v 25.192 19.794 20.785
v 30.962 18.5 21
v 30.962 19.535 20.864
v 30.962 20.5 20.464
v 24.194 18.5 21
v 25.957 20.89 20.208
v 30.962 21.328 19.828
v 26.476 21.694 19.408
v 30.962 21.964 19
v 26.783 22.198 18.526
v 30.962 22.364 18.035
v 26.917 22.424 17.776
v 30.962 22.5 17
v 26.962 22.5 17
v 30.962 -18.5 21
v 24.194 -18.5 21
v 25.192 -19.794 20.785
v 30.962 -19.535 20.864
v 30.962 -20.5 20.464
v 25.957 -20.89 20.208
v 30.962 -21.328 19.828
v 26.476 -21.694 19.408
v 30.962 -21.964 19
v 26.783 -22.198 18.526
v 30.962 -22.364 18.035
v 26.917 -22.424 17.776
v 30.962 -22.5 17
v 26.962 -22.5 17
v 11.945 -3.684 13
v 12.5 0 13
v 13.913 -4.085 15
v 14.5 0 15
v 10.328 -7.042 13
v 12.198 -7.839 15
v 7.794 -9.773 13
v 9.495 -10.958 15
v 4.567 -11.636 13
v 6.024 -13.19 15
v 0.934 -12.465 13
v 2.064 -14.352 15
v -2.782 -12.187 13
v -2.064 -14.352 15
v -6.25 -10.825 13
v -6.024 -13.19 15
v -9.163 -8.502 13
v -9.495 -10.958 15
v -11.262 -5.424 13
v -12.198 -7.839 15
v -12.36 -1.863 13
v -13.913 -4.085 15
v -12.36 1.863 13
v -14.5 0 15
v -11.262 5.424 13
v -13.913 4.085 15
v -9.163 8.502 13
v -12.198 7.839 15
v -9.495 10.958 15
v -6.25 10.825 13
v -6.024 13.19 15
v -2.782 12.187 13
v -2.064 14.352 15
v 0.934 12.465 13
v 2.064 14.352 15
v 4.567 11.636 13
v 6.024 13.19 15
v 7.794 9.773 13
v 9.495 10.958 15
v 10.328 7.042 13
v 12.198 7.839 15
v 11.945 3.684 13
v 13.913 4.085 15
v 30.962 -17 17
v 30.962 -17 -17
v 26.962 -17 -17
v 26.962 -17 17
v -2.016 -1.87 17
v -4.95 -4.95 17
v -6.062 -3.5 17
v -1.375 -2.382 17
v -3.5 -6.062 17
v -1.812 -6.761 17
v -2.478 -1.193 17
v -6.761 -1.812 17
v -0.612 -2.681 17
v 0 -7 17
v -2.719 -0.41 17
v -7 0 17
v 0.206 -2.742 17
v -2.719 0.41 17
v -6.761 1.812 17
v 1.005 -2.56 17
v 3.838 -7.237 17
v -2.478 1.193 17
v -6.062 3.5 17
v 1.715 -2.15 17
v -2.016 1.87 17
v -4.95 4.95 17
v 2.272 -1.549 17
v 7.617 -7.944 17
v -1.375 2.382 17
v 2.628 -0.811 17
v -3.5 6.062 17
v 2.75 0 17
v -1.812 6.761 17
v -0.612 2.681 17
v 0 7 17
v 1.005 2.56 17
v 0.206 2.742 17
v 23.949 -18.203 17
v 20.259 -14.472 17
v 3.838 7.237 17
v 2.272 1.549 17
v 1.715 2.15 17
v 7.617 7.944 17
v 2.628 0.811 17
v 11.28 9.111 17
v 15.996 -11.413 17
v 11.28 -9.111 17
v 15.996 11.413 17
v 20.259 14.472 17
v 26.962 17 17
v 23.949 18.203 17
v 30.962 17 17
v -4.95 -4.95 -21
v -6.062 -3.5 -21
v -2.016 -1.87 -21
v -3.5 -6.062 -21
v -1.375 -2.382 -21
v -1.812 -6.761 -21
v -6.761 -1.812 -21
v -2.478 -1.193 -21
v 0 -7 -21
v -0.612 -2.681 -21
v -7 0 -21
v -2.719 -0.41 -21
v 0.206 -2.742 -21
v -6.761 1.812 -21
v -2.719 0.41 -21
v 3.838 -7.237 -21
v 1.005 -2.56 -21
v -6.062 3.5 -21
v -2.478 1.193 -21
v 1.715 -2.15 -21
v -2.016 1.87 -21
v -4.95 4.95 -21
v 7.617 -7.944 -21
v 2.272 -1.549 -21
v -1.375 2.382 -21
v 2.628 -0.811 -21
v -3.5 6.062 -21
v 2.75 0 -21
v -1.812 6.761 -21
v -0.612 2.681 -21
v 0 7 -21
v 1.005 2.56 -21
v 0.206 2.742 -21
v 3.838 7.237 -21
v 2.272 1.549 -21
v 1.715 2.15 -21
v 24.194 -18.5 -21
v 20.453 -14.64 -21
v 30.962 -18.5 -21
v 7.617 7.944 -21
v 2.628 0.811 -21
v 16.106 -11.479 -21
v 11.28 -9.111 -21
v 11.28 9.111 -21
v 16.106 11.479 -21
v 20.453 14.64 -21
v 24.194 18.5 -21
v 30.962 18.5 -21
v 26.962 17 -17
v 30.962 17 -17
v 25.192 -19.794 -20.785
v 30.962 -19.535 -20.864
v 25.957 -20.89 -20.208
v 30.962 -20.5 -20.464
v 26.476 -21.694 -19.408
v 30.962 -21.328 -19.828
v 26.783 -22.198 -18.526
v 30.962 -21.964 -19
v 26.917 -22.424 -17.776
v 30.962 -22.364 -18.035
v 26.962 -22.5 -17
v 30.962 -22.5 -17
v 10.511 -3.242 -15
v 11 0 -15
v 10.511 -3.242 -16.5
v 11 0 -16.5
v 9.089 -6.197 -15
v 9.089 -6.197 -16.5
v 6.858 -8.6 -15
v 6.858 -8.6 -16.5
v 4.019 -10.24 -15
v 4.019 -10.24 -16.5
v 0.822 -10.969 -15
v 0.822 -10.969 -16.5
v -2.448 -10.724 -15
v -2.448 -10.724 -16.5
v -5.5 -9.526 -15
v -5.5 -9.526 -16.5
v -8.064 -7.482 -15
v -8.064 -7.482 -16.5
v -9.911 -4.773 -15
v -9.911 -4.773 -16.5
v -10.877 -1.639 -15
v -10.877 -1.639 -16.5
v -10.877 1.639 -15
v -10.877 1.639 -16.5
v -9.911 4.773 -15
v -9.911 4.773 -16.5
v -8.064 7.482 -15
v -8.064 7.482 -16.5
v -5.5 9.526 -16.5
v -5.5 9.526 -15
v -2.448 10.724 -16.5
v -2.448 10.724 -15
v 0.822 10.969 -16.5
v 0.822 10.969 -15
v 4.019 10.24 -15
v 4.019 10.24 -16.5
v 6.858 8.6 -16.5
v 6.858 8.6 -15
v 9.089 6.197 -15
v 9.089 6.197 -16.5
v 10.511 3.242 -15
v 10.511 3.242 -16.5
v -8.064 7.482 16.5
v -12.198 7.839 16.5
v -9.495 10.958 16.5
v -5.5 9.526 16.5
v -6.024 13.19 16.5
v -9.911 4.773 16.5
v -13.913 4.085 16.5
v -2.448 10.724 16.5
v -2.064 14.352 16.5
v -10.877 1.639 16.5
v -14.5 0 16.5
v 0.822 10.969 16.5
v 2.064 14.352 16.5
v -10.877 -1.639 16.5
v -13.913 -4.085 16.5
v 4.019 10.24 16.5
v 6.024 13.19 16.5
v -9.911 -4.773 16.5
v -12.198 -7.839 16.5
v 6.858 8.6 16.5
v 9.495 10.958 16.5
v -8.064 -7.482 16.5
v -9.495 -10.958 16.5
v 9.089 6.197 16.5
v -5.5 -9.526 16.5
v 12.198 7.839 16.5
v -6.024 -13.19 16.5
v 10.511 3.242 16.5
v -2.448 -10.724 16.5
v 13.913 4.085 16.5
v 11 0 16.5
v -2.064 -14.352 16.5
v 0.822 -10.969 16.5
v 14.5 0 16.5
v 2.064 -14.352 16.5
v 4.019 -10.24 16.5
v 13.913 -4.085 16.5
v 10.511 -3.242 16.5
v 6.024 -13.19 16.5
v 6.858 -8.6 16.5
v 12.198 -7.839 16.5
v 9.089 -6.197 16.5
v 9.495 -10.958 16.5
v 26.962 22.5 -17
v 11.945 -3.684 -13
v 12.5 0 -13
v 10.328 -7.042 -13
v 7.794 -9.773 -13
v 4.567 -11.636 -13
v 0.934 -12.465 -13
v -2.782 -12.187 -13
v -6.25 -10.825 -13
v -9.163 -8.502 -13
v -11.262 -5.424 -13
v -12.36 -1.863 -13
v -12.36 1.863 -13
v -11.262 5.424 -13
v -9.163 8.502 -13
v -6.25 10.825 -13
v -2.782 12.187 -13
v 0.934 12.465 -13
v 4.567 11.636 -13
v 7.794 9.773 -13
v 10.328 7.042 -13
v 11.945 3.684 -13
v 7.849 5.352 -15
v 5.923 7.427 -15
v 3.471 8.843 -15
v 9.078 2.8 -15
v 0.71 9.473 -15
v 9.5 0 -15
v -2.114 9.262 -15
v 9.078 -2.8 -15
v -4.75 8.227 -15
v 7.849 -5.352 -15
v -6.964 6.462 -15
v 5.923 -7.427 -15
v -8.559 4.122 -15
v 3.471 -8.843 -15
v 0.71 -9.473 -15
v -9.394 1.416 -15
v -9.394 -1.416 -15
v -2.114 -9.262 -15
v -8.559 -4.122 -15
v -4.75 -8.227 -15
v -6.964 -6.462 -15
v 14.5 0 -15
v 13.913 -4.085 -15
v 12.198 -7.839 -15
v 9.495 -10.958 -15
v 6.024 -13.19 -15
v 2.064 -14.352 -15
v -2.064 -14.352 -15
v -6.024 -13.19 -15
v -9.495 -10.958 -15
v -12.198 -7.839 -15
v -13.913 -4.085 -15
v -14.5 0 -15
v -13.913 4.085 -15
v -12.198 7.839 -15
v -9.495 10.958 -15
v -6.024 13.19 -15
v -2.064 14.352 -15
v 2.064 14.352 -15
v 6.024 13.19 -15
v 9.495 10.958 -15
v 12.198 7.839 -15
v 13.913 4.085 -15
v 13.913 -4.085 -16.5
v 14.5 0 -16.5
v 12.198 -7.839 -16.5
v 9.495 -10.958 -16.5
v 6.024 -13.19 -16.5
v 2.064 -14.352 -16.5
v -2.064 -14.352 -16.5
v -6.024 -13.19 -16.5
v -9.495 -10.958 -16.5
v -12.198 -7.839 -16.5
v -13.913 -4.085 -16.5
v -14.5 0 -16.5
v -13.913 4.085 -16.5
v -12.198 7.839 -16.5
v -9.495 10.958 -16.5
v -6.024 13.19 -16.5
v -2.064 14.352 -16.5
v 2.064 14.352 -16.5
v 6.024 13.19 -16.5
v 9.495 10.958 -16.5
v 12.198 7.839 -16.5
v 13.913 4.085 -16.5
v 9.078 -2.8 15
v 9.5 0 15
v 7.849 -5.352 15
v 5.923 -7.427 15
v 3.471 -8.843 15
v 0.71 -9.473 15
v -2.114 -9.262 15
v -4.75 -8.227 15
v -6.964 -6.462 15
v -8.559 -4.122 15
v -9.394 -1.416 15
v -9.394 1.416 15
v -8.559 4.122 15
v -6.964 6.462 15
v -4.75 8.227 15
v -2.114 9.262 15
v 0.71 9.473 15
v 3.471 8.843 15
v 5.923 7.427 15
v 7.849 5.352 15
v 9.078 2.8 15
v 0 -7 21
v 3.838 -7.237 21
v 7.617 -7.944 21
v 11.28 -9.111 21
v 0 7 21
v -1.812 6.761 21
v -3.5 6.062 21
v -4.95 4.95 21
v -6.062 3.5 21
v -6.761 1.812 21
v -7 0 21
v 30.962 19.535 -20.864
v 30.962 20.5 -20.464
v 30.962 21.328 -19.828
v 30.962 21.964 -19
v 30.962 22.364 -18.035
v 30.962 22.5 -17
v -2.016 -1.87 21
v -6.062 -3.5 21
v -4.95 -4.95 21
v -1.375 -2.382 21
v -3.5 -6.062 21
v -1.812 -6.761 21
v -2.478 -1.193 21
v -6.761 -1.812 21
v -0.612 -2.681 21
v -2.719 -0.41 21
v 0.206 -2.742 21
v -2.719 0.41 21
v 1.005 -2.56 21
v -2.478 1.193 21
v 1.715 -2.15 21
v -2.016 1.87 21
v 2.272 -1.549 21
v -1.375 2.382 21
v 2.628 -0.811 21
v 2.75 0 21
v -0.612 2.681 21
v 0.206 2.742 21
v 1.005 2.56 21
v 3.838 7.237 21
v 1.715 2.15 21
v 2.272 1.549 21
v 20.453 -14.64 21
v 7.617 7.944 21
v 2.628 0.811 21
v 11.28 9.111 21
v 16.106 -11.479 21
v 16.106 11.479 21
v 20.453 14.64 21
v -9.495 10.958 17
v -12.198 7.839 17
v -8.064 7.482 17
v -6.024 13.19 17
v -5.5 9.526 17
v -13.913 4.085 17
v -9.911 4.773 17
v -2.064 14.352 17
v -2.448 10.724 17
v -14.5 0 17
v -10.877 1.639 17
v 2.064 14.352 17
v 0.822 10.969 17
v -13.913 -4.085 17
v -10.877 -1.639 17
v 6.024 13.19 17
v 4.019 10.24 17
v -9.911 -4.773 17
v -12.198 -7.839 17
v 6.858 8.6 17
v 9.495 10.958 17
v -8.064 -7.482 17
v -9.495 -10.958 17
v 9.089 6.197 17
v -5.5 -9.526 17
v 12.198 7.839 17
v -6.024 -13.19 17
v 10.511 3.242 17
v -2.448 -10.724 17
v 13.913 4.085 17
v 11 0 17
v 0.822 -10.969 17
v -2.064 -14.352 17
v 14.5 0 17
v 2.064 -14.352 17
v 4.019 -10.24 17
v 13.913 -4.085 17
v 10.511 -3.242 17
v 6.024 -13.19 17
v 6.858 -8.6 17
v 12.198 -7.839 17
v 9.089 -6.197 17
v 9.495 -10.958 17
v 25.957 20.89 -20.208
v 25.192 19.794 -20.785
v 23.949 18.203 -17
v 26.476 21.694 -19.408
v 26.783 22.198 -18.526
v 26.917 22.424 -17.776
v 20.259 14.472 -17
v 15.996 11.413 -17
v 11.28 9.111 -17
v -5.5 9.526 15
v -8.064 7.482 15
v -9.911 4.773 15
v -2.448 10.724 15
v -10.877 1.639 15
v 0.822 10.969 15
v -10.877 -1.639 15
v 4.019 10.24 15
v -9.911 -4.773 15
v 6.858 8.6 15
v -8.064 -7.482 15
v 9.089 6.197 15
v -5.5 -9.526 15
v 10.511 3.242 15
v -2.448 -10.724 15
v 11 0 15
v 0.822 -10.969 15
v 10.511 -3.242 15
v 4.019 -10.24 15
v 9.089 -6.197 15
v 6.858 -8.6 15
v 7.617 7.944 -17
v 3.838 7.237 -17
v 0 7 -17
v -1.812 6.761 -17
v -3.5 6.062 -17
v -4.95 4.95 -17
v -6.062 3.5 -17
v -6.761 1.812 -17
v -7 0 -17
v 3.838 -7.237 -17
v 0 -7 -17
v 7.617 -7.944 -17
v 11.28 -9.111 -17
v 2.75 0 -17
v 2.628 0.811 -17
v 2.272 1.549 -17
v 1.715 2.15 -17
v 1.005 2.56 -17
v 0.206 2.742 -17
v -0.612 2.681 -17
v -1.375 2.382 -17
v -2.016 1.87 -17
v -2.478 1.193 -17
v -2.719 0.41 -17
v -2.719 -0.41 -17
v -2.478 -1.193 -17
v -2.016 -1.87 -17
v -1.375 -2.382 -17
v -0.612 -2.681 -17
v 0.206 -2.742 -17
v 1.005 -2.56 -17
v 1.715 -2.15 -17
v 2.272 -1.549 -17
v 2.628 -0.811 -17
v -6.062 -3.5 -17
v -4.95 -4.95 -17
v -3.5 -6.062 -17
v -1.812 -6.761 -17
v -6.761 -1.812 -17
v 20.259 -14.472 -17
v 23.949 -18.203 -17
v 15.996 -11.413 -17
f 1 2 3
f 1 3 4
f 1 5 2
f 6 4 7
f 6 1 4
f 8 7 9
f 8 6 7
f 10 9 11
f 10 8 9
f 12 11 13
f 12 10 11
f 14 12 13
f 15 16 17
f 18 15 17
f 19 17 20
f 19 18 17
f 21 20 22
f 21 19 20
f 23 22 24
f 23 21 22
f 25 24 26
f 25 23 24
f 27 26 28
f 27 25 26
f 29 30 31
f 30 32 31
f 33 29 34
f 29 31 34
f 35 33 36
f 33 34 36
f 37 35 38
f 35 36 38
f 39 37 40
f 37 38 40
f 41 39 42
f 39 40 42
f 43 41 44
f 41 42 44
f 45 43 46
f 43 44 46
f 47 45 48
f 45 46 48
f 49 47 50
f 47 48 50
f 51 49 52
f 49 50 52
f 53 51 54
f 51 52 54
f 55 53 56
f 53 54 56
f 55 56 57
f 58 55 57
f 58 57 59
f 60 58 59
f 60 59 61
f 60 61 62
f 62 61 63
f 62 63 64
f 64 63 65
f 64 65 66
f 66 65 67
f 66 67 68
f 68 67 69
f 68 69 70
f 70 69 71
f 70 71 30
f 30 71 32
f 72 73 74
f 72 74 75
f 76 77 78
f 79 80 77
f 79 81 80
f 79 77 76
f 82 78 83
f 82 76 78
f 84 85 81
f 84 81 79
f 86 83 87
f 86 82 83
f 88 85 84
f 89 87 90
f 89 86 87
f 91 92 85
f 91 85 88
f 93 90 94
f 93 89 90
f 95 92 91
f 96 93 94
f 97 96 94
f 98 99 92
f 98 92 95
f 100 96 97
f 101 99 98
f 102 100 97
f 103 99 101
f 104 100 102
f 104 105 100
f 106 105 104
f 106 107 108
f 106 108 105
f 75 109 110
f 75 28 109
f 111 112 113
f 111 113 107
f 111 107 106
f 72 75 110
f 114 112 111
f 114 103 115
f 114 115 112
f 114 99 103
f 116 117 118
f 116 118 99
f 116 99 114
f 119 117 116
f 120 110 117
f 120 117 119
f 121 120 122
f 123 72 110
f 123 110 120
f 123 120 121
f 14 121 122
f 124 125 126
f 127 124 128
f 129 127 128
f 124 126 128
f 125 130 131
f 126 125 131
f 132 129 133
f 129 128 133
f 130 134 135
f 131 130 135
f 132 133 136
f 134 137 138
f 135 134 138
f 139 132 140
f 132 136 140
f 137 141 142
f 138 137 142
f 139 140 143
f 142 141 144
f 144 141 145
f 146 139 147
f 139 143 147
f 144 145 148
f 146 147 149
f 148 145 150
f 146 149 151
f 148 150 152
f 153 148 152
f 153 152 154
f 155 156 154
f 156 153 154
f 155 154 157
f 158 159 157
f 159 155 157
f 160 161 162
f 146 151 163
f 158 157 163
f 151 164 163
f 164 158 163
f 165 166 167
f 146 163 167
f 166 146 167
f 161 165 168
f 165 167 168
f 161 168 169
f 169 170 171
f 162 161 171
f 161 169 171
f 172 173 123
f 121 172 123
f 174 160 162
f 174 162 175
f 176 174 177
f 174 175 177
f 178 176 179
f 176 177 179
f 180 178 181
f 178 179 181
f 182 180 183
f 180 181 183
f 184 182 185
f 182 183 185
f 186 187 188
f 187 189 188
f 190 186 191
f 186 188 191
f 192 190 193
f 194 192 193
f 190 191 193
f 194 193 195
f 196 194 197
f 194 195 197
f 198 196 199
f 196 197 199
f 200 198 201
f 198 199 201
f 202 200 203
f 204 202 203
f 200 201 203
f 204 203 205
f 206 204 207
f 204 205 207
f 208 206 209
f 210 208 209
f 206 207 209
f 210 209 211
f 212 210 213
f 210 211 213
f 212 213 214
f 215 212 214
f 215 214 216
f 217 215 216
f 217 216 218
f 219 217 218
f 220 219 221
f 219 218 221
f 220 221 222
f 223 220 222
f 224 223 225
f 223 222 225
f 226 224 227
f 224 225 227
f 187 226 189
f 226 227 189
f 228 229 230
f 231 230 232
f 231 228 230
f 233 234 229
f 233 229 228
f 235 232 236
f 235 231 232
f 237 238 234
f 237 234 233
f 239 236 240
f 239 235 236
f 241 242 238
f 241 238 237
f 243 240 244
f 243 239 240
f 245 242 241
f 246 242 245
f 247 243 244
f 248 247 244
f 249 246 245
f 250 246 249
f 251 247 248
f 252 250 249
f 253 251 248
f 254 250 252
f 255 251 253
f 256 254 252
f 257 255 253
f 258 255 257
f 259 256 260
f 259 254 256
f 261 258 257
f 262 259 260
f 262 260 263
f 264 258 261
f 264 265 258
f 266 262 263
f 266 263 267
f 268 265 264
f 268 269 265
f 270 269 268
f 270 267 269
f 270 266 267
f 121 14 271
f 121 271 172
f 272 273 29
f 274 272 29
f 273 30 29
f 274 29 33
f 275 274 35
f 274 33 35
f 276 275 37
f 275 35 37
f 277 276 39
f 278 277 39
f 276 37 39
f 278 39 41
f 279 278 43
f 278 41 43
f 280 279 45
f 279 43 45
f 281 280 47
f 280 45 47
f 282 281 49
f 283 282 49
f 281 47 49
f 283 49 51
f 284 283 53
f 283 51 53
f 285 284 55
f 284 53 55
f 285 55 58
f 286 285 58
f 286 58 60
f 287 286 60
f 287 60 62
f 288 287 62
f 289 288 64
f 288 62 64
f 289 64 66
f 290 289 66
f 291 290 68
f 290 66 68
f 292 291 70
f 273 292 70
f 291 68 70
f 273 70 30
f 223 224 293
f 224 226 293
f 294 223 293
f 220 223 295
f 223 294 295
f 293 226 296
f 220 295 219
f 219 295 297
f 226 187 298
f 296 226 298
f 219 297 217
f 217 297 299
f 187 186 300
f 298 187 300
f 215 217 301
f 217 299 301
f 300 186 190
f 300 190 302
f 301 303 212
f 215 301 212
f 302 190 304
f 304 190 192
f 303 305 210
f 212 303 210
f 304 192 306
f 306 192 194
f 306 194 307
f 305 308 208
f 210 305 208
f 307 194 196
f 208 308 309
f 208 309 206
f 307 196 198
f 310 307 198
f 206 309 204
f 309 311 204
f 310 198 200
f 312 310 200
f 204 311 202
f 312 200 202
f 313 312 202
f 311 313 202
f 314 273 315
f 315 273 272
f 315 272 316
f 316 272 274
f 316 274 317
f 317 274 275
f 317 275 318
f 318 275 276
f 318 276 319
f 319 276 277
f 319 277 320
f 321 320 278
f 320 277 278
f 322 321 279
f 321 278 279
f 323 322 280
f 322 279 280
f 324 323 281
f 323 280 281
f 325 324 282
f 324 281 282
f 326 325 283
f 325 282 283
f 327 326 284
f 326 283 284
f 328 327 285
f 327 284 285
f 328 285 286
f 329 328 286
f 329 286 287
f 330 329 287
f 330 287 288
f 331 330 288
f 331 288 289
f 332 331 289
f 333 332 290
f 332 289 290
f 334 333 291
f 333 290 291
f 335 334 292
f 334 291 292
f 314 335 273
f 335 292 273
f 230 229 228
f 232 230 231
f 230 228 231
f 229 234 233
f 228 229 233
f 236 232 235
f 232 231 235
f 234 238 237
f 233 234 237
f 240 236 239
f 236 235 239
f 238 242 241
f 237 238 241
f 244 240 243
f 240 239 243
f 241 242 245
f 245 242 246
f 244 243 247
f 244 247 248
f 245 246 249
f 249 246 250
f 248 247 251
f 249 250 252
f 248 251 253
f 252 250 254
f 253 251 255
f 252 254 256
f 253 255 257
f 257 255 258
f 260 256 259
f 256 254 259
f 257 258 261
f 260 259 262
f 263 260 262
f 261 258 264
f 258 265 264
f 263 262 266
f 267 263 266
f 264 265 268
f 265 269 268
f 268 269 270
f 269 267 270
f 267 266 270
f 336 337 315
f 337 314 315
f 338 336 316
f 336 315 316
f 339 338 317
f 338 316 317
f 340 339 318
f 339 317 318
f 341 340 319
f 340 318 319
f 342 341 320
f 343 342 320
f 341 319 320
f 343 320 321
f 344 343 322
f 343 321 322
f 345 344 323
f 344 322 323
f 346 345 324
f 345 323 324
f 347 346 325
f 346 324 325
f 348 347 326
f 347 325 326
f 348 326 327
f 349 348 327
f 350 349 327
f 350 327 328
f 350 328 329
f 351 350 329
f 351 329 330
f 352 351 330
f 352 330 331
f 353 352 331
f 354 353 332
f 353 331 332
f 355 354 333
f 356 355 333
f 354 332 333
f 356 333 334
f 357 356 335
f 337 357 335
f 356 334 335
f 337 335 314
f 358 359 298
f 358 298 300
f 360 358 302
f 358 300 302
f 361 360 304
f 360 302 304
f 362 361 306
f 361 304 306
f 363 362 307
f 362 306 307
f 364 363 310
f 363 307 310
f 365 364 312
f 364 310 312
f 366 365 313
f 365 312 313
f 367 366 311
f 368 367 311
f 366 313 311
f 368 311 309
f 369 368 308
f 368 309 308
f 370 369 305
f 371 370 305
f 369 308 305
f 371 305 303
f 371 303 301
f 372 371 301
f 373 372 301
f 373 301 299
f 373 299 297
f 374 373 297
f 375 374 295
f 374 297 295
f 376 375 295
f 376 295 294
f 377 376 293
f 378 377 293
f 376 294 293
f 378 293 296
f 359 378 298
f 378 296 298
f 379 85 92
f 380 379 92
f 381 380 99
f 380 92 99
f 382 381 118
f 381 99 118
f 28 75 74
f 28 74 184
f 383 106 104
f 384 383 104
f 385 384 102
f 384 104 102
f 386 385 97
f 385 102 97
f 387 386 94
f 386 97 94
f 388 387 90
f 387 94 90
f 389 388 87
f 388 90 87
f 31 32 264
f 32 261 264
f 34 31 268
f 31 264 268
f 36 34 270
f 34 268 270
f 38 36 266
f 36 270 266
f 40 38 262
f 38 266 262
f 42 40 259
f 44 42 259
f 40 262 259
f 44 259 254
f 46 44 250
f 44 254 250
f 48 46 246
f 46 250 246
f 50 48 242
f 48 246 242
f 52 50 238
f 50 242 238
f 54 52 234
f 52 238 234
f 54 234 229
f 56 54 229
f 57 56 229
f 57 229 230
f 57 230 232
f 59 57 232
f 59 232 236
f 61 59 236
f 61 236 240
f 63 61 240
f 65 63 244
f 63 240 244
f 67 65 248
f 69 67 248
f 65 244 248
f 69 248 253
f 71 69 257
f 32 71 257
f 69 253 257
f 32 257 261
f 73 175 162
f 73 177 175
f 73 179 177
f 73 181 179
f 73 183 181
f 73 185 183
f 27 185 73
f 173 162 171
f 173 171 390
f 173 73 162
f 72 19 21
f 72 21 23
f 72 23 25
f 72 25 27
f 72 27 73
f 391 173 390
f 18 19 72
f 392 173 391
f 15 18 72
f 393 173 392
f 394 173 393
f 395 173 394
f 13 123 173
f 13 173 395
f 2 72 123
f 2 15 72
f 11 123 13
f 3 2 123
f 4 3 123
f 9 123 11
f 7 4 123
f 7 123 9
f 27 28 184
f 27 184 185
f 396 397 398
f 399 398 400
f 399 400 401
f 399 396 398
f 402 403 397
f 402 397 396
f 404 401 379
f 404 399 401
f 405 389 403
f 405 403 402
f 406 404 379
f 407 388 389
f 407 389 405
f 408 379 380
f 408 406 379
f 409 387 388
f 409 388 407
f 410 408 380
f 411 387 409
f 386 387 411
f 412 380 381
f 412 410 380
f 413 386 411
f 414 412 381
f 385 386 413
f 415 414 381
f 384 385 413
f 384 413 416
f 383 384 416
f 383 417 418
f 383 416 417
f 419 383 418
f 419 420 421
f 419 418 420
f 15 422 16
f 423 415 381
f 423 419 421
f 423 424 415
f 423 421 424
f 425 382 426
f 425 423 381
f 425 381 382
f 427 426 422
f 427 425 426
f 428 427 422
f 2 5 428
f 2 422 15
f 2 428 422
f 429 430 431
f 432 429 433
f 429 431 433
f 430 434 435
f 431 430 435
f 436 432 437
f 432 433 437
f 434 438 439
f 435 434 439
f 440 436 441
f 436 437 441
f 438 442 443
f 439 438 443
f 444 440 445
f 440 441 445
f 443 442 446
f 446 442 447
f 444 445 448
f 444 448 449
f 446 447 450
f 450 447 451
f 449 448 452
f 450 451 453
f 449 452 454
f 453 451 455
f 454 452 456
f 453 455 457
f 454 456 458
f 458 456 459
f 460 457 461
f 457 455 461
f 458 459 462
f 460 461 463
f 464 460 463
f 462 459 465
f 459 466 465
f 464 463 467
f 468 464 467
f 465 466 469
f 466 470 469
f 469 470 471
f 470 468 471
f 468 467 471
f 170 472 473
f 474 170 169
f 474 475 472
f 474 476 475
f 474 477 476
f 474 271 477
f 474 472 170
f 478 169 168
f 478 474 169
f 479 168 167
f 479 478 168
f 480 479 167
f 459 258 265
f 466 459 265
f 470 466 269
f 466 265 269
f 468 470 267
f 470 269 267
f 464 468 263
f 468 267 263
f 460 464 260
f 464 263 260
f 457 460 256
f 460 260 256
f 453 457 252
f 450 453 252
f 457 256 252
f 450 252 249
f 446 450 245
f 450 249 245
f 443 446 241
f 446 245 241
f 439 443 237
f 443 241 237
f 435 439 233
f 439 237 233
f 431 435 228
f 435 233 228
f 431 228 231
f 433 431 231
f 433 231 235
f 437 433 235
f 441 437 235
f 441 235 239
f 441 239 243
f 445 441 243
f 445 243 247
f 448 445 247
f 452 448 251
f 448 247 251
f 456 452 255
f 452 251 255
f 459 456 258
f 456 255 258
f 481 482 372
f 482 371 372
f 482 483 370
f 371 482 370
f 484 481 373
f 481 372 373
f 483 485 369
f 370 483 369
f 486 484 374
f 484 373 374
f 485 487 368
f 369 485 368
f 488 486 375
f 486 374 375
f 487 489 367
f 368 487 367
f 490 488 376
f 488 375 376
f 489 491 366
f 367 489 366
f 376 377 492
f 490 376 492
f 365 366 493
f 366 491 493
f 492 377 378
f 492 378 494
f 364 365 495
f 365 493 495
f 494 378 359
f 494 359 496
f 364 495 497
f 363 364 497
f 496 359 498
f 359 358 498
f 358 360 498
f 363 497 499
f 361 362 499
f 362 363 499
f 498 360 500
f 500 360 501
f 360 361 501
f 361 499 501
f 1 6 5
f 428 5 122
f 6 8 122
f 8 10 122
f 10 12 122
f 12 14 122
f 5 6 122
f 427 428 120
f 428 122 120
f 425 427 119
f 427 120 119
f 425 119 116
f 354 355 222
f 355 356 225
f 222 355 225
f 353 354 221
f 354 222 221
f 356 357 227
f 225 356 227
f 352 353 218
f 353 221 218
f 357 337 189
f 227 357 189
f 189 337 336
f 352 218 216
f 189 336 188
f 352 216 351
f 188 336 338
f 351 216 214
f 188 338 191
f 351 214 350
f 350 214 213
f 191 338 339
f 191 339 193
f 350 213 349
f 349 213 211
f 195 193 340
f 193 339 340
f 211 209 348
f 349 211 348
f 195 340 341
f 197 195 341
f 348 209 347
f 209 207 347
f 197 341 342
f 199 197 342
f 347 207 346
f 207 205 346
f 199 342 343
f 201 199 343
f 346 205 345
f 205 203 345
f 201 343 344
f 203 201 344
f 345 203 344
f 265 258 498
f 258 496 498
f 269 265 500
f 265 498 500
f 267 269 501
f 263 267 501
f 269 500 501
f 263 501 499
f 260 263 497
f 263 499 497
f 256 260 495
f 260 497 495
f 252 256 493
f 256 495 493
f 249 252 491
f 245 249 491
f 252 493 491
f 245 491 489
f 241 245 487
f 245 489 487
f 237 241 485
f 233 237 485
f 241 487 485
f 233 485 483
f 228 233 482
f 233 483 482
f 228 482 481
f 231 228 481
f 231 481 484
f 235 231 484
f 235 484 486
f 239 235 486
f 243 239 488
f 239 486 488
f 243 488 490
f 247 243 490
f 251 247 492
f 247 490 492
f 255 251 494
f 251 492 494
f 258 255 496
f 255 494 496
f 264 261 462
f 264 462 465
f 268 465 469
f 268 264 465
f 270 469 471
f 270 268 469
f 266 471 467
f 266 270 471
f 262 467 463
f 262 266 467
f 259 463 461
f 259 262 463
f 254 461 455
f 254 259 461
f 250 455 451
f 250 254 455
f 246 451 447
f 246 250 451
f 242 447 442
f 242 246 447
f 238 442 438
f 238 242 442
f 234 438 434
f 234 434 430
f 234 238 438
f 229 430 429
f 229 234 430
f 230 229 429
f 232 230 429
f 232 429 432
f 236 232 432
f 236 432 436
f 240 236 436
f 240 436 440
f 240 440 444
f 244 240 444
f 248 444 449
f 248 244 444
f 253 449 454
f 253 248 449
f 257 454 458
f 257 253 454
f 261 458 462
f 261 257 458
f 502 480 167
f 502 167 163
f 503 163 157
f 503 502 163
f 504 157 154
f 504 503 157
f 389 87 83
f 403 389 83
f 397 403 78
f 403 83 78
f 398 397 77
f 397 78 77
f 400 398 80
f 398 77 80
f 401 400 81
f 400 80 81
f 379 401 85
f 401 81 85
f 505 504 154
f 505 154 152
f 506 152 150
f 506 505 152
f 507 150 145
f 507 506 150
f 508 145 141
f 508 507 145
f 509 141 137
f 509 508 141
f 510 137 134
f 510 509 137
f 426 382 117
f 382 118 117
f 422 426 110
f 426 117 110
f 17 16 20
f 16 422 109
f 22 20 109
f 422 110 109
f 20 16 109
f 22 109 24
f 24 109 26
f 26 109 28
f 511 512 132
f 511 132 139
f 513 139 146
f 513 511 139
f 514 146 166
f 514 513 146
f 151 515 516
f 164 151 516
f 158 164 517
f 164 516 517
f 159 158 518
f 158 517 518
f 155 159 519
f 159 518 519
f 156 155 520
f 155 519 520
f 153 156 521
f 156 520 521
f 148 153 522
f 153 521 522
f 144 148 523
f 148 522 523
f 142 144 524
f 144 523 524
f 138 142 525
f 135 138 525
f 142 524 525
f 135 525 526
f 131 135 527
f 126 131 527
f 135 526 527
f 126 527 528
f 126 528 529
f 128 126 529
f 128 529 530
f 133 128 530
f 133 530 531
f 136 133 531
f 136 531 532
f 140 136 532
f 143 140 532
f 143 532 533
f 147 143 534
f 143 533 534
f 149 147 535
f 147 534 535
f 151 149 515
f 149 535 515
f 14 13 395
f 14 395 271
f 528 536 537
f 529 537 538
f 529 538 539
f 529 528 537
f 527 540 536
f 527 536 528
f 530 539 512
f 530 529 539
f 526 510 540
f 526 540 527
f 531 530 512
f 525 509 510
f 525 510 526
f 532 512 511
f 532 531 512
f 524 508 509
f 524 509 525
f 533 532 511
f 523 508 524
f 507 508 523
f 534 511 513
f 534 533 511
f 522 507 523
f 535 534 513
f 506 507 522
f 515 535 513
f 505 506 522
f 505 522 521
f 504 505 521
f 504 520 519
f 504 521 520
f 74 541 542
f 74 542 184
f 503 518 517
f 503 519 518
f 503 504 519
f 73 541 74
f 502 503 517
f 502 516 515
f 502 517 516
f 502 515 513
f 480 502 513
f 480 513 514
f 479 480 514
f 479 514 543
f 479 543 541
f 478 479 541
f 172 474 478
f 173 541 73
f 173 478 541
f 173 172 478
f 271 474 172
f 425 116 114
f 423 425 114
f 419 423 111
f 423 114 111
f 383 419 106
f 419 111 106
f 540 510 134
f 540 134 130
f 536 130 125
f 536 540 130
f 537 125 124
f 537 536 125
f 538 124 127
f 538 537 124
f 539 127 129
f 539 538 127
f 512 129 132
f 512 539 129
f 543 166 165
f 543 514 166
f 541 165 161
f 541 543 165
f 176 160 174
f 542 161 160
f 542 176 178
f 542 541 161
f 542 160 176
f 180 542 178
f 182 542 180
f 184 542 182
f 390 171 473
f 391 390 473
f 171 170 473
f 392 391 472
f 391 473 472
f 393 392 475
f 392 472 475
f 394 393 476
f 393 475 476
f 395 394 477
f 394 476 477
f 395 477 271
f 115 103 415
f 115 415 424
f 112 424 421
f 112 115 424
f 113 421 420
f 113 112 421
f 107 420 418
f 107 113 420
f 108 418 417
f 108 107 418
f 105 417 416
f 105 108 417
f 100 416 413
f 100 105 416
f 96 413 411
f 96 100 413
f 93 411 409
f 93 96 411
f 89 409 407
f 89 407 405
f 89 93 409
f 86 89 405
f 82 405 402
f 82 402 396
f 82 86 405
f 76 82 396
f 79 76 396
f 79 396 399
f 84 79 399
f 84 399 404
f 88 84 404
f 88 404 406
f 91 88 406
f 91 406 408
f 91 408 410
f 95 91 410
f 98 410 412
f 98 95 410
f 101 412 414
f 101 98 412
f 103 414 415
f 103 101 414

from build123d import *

# Parameters (mm, degrees)
F2_DEPTH = 0.5
F3_R     = 2.75
F4_DEPTH = 4
F6_DEPTH = 34
F7_R     = 4
F8_W     = 34
F8_H     = 34
F9_DEPTH = 4


# Not quite as in the source:
# - a feature names something its author has since deleted; it is built from what else it names


with BuildPart() as f1:
    # F0 (on Front) → F1 (revolve)
    with BuildSketch(Plane.XZ):
        Polygon((14.5, 16.5), (11, 16.5), (11, 15), (9.5, 15), (9.5, 0), (9.5, -15), (11, -15), (11, -16.5), (14.5, -16.5), (14.5, -15), (12.5, -13), (12.5, 0), (12.5, 13), (14.5, 15), align=None)
    revolve(axis=Axis((0, 0, 0.2111420035), (0, 0, -1)))


with BuildPart() as f2:
    # F2 (new): a face of the model
    f2_faces = [f1.part.faces().sort_by_distance(p)[0] for p in [
        (-14.0898780669, 0, 16.5),
    ]]
    extrude(f2_faces, amount=F2_DEPTH)


with BuildPart() as f4:
    # F3 (on face) → F4 (new body)
    with BuildSketch(Plane.XY.offset(17)):
        with BuildLine():
            ThreePointArc((11, 0), (10.1171669047, 4.3177463824), (7.6103756686, 7.9424292369))
            ThreePointArc((7.6103756686, 7.9424292369), (3.834253209, 7.2365037118), (0, 7))
            ThreePointArc((0, 7), (-4.9497474683, 4.9497474683), (-7, 0))
            ThreePointArc((-7, 0), (-4.9497474683, -4.9497474683), (0, -7))
            ThreePointArc((0, -7), (3.834253209, -7.2365037118), (7.6103756686, -7.9424292369))
            ThreePointArc((7.6103756686, -7.9424292369), (10.1171669047, -4.3177463824), (11, 0))
        make_face()
        Circle(F3_R, mode=Mode.SUBTRACT)
        with BuildLine():
            Line((26.9615242271, -22.5), (26.9615242271, 0))
            Line((26.9615242271, 0), (26.9615242271, 22.5))
            ThreePointArc((26.9615242271, 22.5), (20.2590407655, 14.4724078126), (11.2803403418, 9.1106488118))
            ThreePointArc((11.2803403418, 9.1106488118), (13.6714105885, 4.831411028), (14.5, 0))
            ThreePointArc((14.5, 0), (13.6714105885, -4.831411028), (11.2803403418, -9.1106488118))
            ThreePointArc((11.2803403418, -9.1106488118), (20.2590407655, -14.4724078126), (26.9615242271, -22.5))
        make_face()
        Polygon((26.9615242271, 22.5), (26.9615242271, 0), (26.9615242271, -22.5), (30.9615242271, -22.5), (30.9615242271, 0), (30.9615242271, 22.5), align=None)
        with BuildLine():
            ThreePointArc((14.5, 0), (13.6714105885, 4.831411028), (11.2803403418, 9.1106488118))
            ThreePointArc((11.2803403418, 9.1106488118), (9.4634017187, 8.4698546538), (7.6103756686, 7.9424292369))
            ThreePointArc((7.6103756686, 7.9424292369), (10.1171669047, 4.3177463824), (11, 0))
            ThreePointArc((11, 0), (10.1171669047, -4.3177463824), (7.6103756686, -7.9424292369))
            ThreePointArc((7.6103756686, -7.9424292369), (9.4634017187, -8.4698546538), (11.2803403418, -9.1106488118))
            ThreePointArc((11.2803403418, -9.1106488118), (13.6714105885, -4.831411028), (14.5, 0))
        make_face()
    extrude(amount=F4_DEPTH)


with BuildPart() as f5_1:
    # F5: instance of F4
    add(f4.part.mirror(Plane.XY))


with BuildPart() as f4_1:
    add(f4.part)

    add(f5_1.part)  # F6 merges F5_1
    # F3 (on face) → F6 (join, through all)
    with BuildSketch(Plane.XY.offset(17)):
        Polygon((26.9615242271, 22.5), (26.9615242271, 0), (26.9615242271, -22.5), (30.9615242271, -22.5), (30.9615242271, 0), (30.9615242271, 22.5), align=None)
    extrude(amount=-F6_DEPTH)

    # F7
    f7_edges = [f4_1.edges().sort_by_distance(p)[0] for p in [
        (28.961524, 22.5, 21),
        (28.961524, 22.5, -21),
        (28.961524, -22.5, -21),
        (28.961524, -22.5, 21),
    ]]
    fillet(f7_edges, radius=F7_R)

    # F8 (on face) → F9 (cut, through all)
    with BuildSketch(Plane.YZ.offset(30.9615242271)):
        Rectangle(F8_W, F8_H)
    extrude(amount=-F9_DEPTH, mode=Mode.SUBTRACT)


solid = Compound([f1.part, f2.part, f4_1.part])
